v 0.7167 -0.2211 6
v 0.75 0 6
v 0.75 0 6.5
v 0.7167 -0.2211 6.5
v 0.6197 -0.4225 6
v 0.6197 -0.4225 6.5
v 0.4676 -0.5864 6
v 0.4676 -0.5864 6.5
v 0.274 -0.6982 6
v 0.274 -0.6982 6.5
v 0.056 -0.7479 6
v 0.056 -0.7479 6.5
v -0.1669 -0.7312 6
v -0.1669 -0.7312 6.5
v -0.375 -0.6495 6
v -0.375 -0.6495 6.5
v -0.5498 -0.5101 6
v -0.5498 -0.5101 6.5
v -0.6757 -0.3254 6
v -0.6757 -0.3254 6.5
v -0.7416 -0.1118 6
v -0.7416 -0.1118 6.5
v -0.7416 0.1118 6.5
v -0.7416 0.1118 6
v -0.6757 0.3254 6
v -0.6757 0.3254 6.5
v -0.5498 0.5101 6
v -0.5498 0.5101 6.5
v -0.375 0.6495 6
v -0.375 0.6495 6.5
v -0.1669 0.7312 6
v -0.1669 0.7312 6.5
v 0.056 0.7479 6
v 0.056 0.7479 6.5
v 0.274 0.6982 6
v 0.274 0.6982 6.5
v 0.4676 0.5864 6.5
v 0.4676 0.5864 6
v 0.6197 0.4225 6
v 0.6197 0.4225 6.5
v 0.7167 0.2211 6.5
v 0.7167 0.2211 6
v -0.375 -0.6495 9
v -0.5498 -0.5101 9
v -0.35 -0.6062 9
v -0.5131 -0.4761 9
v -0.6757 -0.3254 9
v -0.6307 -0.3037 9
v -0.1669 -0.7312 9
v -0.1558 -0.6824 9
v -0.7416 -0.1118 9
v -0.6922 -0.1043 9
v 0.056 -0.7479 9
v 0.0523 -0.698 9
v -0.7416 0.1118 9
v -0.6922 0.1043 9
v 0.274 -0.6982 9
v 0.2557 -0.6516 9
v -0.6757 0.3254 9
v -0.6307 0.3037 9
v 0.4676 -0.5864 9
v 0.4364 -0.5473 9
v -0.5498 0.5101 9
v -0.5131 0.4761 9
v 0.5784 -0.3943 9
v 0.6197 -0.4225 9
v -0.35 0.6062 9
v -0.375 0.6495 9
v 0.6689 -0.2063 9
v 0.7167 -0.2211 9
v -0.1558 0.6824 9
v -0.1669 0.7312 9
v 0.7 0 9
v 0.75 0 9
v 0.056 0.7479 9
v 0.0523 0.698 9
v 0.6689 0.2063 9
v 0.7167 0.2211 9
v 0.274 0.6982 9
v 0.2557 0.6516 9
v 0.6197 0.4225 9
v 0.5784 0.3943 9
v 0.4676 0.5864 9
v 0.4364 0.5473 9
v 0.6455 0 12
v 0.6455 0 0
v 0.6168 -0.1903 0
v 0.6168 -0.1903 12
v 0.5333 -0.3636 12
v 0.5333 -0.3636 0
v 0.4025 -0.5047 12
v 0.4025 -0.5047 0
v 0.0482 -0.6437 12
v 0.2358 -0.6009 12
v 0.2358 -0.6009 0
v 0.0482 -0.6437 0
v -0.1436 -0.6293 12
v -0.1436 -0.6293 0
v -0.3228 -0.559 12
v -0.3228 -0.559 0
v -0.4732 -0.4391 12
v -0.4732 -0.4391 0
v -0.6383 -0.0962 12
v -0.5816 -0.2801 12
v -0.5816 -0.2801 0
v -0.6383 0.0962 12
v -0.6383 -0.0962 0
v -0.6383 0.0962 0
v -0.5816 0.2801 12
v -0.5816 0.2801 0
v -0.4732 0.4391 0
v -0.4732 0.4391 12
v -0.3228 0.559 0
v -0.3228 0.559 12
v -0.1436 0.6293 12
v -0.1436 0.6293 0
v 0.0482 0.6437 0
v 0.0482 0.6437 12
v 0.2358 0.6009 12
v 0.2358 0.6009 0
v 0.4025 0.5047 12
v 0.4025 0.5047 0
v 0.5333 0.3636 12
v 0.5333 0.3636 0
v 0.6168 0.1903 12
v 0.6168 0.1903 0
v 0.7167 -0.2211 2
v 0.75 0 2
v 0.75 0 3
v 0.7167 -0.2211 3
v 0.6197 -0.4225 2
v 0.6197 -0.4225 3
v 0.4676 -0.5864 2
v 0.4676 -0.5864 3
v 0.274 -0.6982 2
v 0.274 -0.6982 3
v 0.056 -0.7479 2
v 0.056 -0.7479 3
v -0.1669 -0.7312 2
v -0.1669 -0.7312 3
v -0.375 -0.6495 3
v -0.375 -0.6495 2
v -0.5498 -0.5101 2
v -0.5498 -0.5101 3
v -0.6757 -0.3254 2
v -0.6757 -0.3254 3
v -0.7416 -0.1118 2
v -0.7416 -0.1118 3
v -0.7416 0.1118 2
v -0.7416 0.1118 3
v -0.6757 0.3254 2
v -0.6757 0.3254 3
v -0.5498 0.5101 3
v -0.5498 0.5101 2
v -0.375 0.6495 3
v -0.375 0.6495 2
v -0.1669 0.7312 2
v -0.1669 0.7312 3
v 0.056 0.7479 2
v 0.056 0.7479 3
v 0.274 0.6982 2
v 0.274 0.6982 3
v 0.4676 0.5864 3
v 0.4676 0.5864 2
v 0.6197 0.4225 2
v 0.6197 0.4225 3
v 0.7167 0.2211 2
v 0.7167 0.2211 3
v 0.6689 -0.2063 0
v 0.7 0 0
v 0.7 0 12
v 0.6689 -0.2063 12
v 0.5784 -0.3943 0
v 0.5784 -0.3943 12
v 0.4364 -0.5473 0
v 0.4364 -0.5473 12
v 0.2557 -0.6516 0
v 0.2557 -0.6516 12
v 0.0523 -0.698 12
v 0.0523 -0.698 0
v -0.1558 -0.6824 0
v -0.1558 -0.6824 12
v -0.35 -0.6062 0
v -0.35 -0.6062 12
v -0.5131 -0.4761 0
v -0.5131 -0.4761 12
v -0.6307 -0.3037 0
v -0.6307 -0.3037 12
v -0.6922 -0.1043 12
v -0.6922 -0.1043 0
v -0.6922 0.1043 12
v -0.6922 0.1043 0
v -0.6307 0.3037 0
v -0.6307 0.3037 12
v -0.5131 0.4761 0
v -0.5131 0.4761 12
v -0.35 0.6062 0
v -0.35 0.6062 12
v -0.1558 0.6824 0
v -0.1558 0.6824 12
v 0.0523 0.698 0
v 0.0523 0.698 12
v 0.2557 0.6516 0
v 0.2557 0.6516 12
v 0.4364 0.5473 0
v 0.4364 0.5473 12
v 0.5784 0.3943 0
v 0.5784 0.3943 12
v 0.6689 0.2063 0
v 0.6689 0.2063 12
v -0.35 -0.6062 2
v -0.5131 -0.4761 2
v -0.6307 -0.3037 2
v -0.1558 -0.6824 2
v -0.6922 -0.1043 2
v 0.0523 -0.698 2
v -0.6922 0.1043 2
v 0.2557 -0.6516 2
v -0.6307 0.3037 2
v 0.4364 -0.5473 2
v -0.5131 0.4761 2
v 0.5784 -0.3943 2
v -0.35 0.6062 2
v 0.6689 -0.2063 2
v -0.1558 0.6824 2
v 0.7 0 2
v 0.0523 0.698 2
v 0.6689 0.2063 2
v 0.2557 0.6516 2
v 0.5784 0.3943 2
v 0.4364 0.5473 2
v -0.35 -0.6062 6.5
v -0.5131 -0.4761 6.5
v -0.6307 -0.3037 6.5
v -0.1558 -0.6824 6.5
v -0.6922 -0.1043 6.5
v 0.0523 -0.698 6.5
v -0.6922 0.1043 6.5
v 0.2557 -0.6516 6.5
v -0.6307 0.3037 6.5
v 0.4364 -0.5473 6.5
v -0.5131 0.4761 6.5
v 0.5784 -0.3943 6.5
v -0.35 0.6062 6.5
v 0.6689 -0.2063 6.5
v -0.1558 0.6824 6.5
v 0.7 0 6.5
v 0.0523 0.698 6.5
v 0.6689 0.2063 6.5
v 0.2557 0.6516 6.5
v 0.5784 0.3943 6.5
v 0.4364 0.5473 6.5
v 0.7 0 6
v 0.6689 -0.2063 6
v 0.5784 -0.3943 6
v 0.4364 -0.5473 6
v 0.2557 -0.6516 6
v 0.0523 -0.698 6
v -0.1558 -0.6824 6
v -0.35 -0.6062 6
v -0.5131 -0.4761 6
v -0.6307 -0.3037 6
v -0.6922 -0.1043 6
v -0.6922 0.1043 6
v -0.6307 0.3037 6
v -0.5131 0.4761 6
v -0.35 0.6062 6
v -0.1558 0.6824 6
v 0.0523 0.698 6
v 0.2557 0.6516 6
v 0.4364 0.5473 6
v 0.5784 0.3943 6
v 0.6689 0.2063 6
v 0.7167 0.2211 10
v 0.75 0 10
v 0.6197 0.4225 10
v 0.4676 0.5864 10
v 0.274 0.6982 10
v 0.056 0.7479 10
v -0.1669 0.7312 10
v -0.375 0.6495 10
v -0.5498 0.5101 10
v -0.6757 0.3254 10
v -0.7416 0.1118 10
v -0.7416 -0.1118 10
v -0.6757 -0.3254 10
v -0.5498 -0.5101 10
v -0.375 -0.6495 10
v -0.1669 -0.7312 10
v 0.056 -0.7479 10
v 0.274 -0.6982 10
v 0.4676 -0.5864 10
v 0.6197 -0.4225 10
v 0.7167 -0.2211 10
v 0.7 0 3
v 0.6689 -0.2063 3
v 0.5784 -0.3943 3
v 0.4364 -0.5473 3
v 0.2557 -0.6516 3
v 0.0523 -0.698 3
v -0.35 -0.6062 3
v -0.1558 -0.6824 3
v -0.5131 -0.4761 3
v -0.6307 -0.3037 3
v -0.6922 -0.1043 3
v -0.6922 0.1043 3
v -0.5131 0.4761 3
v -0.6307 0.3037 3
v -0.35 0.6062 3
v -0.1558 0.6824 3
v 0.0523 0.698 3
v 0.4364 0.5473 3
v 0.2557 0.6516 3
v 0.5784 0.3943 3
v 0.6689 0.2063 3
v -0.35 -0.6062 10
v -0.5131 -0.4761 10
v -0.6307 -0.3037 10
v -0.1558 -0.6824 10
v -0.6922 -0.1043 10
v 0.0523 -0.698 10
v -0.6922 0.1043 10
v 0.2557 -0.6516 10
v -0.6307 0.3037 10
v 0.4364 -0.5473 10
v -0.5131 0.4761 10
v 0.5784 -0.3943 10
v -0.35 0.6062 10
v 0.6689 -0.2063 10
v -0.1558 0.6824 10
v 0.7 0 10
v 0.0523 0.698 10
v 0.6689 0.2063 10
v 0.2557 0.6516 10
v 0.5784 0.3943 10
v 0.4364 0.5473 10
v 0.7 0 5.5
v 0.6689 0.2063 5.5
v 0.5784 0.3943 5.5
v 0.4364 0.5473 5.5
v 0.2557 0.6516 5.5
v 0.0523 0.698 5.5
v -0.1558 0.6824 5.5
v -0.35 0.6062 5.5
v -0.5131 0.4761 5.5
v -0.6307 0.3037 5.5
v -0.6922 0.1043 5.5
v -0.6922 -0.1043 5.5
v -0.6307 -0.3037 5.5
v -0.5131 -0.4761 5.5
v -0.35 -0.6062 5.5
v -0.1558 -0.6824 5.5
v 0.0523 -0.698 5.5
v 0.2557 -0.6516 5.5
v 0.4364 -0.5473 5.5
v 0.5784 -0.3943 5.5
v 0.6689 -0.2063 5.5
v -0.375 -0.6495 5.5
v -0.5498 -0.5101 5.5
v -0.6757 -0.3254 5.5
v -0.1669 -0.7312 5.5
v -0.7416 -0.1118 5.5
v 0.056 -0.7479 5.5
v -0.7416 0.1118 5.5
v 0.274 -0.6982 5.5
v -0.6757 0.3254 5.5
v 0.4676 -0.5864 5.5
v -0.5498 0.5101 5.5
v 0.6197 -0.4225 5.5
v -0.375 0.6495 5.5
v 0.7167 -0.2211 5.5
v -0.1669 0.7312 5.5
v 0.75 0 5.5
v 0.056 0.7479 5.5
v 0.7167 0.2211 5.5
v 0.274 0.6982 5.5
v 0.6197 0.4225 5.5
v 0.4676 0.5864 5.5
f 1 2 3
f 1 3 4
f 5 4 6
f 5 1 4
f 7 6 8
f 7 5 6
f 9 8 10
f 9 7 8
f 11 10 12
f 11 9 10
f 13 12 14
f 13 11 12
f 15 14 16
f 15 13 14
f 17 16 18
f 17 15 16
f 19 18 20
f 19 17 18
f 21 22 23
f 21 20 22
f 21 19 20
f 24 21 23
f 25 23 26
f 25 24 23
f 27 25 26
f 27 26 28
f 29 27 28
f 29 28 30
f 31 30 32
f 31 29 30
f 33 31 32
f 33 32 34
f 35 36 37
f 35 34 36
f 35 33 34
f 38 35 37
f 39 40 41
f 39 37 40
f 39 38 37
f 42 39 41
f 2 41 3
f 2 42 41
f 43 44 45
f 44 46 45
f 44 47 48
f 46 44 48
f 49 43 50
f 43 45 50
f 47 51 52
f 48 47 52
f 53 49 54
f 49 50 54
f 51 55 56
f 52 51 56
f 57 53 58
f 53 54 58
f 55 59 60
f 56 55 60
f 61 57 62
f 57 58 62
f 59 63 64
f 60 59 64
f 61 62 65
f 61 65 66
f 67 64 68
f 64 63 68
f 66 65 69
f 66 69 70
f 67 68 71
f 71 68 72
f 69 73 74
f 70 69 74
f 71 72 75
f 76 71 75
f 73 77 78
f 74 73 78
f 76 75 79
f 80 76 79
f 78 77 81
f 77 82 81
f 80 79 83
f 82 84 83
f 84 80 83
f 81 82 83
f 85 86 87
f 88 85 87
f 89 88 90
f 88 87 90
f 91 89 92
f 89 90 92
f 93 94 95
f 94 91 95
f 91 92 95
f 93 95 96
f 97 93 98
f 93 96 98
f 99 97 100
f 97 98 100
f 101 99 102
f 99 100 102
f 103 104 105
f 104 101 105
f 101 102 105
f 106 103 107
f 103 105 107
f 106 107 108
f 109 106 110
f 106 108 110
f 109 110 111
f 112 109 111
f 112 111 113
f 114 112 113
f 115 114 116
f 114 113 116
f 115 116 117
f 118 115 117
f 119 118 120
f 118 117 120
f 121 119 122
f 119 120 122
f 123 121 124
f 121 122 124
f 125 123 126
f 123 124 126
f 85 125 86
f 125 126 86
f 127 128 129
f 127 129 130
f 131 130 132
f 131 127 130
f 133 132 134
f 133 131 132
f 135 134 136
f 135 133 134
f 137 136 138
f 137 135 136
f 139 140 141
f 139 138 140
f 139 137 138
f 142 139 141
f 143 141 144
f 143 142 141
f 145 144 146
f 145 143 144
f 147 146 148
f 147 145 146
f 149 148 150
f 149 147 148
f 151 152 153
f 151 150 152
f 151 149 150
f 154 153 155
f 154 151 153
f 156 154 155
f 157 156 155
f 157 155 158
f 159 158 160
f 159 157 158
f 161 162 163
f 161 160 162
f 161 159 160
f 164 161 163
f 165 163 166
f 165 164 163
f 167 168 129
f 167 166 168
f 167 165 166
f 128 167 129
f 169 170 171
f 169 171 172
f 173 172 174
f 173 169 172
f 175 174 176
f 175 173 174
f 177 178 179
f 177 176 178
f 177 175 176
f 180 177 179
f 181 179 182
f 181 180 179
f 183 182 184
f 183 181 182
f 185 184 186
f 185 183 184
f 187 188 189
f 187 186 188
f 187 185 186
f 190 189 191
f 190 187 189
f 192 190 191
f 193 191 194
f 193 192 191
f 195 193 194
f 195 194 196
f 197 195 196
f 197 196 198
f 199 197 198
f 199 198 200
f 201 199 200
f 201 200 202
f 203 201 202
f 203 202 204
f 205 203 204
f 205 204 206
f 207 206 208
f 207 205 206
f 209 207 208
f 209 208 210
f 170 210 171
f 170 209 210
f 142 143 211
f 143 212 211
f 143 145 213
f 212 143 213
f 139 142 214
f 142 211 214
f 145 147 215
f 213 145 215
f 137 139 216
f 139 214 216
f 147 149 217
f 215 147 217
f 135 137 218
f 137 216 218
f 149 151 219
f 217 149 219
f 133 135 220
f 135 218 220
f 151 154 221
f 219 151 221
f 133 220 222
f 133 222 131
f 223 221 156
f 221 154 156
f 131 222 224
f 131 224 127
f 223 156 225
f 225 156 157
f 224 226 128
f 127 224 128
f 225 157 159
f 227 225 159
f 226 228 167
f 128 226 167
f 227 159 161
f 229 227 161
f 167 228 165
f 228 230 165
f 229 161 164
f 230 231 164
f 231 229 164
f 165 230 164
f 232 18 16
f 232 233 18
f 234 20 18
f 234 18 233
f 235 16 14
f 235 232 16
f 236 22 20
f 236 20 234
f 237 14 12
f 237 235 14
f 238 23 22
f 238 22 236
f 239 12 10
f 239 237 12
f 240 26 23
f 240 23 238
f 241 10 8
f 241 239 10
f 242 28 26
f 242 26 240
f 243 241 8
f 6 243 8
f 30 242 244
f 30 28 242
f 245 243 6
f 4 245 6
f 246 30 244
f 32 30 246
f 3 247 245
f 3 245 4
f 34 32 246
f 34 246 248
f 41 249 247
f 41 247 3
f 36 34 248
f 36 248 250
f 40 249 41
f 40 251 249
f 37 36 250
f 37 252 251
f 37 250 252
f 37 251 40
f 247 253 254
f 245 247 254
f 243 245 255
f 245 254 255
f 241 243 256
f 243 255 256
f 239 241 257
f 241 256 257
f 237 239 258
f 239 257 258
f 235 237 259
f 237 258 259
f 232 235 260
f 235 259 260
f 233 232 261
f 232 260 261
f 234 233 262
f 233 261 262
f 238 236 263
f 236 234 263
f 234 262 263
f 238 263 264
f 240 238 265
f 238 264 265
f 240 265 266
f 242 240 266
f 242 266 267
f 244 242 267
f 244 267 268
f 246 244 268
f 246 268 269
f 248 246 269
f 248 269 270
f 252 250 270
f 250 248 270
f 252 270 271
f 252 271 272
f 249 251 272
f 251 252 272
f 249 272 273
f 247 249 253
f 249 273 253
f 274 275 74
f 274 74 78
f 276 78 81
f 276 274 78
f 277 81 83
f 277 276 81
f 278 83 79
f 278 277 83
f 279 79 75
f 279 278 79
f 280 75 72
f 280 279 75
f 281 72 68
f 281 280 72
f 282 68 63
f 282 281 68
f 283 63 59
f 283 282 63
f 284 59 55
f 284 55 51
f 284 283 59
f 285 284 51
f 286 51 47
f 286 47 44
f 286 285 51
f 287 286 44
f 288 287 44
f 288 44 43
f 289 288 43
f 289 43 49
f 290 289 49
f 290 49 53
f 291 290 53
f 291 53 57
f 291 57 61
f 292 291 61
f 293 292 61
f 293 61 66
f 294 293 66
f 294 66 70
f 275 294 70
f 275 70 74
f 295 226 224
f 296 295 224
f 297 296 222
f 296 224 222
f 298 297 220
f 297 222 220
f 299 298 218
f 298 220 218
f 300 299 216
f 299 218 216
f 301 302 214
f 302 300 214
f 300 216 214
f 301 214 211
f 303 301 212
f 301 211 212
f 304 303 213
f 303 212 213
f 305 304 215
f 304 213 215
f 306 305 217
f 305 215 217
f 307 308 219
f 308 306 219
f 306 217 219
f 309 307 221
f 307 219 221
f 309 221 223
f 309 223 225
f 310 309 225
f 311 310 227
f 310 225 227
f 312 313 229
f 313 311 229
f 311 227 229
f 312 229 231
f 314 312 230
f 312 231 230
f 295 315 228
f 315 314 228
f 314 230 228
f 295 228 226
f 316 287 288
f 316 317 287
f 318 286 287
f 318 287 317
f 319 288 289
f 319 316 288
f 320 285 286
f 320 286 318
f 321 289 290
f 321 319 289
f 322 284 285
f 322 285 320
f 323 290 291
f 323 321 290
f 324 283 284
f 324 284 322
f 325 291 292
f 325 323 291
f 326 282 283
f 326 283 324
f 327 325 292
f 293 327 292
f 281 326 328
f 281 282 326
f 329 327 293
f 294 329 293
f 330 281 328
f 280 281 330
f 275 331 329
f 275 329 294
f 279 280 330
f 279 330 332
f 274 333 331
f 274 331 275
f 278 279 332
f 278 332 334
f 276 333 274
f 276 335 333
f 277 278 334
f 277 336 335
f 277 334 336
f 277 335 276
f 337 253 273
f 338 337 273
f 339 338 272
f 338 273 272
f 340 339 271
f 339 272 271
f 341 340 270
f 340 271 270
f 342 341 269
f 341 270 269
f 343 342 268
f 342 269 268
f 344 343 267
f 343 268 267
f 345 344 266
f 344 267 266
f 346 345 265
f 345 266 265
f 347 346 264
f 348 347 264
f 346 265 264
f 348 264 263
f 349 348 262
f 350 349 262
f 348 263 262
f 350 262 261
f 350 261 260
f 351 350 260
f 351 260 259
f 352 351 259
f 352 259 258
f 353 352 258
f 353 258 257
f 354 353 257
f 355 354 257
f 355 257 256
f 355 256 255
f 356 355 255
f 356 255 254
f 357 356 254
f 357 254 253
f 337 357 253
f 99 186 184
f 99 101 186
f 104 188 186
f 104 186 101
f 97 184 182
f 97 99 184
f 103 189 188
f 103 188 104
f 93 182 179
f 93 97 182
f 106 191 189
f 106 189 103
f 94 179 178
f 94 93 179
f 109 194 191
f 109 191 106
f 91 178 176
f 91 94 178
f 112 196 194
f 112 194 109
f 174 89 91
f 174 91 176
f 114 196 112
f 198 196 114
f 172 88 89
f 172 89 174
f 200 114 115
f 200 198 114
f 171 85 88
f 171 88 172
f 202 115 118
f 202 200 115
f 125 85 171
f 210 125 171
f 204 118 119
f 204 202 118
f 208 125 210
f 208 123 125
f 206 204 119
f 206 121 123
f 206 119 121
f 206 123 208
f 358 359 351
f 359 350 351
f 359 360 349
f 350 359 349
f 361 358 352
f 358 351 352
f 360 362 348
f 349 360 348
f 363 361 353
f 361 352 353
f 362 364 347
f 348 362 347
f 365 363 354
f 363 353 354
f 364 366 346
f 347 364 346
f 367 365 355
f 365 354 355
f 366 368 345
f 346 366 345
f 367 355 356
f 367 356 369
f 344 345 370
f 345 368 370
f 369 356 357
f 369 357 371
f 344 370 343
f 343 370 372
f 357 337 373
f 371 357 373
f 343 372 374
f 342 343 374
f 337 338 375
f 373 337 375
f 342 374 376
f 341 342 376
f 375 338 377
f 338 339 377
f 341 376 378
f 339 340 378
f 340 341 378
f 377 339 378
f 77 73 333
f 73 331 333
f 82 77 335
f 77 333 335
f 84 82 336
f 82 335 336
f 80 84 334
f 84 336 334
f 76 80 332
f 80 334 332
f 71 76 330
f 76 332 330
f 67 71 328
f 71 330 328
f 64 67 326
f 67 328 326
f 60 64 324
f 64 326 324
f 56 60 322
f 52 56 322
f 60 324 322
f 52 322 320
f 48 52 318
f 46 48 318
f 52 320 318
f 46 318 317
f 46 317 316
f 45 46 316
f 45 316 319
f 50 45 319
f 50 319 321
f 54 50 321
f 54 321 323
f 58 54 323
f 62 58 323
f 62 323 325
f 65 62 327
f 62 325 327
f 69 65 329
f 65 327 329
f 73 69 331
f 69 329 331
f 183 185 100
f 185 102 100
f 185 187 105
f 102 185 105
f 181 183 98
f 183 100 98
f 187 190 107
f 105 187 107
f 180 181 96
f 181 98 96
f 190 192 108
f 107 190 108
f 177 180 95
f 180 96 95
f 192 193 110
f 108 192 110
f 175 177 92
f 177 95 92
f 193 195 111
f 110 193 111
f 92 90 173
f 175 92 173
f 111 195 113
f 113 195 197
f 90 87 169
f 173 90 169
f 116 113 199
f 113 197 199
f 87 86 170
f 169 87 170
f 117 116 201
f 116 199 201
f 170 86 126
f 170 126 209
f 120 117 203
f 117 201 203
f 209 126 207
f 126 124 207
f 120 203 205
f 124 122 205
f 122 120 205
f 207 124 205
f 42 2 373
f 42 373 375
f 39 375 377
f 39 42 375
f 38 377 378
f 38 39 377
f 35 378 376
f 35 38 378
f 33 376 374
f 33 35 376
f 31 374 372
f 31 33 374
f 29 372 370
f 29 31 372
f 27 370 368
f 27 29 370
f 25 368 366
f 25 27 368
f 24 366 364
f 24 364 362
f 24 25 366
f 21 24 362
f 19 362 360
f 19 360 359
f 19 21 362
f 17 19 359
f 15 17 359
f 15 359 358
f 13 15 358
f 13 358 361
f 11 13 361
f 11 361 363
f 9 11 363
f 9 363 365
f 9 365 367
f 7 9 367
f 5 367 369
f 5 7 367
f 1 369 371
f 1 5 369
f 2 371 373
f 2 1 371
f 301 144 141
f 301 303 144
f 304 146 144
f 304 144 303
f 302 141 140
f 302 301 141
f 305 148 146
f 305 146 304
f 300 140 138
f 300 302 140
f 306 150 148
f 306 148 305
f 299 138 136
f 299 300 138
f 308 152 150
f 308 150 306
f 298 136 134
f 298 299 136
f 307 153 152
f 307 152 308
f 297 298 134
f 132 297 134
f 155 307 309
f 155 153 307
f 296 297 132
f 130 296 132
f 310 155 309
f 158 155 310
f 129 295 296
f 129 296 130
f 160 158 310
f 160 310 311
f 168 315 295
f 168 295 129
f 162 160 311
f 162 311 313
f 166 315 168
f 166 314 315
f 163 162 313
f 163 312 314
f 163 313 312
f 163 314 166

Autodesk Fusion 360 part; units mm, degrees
sketch "Sketch1" plane through (0, 0, 0) normal (0, 0, 1) x (1, 0, 0)
  circle A0 centre (0, 0) radius 0.6455
  circle A1 centre (0, 0) radius 0.7
  dimension "d1" = 1.291
  dimension "d2" = 1.4
extrude "Extrude1" add sketch "Sketch1" along normal blind 12 makes body 1
sketch "Sketch2" plane through (0, 0, 0) normal (0, 0, 1) x (1, 0, 0)
  circle A0 centre (0, 0) radius 0.7
  circle A1 centre (0, 0) radius 0.75
  dimension "d5" = 1.4
  dimension "d6" = 1.5
extrude "Extrude2" add sketch "Sketch2" along normal blind 1 from surface at 2 separate body makes body 2
extrude "Extrude3" add sketch "Sketch2" against normal blind 1 from surface at 10 separate body makes body 3
extrude "Extrude4" add sketch "Sketch2" along normal mid plane 1 from surface at 6 separate body makes body 4
